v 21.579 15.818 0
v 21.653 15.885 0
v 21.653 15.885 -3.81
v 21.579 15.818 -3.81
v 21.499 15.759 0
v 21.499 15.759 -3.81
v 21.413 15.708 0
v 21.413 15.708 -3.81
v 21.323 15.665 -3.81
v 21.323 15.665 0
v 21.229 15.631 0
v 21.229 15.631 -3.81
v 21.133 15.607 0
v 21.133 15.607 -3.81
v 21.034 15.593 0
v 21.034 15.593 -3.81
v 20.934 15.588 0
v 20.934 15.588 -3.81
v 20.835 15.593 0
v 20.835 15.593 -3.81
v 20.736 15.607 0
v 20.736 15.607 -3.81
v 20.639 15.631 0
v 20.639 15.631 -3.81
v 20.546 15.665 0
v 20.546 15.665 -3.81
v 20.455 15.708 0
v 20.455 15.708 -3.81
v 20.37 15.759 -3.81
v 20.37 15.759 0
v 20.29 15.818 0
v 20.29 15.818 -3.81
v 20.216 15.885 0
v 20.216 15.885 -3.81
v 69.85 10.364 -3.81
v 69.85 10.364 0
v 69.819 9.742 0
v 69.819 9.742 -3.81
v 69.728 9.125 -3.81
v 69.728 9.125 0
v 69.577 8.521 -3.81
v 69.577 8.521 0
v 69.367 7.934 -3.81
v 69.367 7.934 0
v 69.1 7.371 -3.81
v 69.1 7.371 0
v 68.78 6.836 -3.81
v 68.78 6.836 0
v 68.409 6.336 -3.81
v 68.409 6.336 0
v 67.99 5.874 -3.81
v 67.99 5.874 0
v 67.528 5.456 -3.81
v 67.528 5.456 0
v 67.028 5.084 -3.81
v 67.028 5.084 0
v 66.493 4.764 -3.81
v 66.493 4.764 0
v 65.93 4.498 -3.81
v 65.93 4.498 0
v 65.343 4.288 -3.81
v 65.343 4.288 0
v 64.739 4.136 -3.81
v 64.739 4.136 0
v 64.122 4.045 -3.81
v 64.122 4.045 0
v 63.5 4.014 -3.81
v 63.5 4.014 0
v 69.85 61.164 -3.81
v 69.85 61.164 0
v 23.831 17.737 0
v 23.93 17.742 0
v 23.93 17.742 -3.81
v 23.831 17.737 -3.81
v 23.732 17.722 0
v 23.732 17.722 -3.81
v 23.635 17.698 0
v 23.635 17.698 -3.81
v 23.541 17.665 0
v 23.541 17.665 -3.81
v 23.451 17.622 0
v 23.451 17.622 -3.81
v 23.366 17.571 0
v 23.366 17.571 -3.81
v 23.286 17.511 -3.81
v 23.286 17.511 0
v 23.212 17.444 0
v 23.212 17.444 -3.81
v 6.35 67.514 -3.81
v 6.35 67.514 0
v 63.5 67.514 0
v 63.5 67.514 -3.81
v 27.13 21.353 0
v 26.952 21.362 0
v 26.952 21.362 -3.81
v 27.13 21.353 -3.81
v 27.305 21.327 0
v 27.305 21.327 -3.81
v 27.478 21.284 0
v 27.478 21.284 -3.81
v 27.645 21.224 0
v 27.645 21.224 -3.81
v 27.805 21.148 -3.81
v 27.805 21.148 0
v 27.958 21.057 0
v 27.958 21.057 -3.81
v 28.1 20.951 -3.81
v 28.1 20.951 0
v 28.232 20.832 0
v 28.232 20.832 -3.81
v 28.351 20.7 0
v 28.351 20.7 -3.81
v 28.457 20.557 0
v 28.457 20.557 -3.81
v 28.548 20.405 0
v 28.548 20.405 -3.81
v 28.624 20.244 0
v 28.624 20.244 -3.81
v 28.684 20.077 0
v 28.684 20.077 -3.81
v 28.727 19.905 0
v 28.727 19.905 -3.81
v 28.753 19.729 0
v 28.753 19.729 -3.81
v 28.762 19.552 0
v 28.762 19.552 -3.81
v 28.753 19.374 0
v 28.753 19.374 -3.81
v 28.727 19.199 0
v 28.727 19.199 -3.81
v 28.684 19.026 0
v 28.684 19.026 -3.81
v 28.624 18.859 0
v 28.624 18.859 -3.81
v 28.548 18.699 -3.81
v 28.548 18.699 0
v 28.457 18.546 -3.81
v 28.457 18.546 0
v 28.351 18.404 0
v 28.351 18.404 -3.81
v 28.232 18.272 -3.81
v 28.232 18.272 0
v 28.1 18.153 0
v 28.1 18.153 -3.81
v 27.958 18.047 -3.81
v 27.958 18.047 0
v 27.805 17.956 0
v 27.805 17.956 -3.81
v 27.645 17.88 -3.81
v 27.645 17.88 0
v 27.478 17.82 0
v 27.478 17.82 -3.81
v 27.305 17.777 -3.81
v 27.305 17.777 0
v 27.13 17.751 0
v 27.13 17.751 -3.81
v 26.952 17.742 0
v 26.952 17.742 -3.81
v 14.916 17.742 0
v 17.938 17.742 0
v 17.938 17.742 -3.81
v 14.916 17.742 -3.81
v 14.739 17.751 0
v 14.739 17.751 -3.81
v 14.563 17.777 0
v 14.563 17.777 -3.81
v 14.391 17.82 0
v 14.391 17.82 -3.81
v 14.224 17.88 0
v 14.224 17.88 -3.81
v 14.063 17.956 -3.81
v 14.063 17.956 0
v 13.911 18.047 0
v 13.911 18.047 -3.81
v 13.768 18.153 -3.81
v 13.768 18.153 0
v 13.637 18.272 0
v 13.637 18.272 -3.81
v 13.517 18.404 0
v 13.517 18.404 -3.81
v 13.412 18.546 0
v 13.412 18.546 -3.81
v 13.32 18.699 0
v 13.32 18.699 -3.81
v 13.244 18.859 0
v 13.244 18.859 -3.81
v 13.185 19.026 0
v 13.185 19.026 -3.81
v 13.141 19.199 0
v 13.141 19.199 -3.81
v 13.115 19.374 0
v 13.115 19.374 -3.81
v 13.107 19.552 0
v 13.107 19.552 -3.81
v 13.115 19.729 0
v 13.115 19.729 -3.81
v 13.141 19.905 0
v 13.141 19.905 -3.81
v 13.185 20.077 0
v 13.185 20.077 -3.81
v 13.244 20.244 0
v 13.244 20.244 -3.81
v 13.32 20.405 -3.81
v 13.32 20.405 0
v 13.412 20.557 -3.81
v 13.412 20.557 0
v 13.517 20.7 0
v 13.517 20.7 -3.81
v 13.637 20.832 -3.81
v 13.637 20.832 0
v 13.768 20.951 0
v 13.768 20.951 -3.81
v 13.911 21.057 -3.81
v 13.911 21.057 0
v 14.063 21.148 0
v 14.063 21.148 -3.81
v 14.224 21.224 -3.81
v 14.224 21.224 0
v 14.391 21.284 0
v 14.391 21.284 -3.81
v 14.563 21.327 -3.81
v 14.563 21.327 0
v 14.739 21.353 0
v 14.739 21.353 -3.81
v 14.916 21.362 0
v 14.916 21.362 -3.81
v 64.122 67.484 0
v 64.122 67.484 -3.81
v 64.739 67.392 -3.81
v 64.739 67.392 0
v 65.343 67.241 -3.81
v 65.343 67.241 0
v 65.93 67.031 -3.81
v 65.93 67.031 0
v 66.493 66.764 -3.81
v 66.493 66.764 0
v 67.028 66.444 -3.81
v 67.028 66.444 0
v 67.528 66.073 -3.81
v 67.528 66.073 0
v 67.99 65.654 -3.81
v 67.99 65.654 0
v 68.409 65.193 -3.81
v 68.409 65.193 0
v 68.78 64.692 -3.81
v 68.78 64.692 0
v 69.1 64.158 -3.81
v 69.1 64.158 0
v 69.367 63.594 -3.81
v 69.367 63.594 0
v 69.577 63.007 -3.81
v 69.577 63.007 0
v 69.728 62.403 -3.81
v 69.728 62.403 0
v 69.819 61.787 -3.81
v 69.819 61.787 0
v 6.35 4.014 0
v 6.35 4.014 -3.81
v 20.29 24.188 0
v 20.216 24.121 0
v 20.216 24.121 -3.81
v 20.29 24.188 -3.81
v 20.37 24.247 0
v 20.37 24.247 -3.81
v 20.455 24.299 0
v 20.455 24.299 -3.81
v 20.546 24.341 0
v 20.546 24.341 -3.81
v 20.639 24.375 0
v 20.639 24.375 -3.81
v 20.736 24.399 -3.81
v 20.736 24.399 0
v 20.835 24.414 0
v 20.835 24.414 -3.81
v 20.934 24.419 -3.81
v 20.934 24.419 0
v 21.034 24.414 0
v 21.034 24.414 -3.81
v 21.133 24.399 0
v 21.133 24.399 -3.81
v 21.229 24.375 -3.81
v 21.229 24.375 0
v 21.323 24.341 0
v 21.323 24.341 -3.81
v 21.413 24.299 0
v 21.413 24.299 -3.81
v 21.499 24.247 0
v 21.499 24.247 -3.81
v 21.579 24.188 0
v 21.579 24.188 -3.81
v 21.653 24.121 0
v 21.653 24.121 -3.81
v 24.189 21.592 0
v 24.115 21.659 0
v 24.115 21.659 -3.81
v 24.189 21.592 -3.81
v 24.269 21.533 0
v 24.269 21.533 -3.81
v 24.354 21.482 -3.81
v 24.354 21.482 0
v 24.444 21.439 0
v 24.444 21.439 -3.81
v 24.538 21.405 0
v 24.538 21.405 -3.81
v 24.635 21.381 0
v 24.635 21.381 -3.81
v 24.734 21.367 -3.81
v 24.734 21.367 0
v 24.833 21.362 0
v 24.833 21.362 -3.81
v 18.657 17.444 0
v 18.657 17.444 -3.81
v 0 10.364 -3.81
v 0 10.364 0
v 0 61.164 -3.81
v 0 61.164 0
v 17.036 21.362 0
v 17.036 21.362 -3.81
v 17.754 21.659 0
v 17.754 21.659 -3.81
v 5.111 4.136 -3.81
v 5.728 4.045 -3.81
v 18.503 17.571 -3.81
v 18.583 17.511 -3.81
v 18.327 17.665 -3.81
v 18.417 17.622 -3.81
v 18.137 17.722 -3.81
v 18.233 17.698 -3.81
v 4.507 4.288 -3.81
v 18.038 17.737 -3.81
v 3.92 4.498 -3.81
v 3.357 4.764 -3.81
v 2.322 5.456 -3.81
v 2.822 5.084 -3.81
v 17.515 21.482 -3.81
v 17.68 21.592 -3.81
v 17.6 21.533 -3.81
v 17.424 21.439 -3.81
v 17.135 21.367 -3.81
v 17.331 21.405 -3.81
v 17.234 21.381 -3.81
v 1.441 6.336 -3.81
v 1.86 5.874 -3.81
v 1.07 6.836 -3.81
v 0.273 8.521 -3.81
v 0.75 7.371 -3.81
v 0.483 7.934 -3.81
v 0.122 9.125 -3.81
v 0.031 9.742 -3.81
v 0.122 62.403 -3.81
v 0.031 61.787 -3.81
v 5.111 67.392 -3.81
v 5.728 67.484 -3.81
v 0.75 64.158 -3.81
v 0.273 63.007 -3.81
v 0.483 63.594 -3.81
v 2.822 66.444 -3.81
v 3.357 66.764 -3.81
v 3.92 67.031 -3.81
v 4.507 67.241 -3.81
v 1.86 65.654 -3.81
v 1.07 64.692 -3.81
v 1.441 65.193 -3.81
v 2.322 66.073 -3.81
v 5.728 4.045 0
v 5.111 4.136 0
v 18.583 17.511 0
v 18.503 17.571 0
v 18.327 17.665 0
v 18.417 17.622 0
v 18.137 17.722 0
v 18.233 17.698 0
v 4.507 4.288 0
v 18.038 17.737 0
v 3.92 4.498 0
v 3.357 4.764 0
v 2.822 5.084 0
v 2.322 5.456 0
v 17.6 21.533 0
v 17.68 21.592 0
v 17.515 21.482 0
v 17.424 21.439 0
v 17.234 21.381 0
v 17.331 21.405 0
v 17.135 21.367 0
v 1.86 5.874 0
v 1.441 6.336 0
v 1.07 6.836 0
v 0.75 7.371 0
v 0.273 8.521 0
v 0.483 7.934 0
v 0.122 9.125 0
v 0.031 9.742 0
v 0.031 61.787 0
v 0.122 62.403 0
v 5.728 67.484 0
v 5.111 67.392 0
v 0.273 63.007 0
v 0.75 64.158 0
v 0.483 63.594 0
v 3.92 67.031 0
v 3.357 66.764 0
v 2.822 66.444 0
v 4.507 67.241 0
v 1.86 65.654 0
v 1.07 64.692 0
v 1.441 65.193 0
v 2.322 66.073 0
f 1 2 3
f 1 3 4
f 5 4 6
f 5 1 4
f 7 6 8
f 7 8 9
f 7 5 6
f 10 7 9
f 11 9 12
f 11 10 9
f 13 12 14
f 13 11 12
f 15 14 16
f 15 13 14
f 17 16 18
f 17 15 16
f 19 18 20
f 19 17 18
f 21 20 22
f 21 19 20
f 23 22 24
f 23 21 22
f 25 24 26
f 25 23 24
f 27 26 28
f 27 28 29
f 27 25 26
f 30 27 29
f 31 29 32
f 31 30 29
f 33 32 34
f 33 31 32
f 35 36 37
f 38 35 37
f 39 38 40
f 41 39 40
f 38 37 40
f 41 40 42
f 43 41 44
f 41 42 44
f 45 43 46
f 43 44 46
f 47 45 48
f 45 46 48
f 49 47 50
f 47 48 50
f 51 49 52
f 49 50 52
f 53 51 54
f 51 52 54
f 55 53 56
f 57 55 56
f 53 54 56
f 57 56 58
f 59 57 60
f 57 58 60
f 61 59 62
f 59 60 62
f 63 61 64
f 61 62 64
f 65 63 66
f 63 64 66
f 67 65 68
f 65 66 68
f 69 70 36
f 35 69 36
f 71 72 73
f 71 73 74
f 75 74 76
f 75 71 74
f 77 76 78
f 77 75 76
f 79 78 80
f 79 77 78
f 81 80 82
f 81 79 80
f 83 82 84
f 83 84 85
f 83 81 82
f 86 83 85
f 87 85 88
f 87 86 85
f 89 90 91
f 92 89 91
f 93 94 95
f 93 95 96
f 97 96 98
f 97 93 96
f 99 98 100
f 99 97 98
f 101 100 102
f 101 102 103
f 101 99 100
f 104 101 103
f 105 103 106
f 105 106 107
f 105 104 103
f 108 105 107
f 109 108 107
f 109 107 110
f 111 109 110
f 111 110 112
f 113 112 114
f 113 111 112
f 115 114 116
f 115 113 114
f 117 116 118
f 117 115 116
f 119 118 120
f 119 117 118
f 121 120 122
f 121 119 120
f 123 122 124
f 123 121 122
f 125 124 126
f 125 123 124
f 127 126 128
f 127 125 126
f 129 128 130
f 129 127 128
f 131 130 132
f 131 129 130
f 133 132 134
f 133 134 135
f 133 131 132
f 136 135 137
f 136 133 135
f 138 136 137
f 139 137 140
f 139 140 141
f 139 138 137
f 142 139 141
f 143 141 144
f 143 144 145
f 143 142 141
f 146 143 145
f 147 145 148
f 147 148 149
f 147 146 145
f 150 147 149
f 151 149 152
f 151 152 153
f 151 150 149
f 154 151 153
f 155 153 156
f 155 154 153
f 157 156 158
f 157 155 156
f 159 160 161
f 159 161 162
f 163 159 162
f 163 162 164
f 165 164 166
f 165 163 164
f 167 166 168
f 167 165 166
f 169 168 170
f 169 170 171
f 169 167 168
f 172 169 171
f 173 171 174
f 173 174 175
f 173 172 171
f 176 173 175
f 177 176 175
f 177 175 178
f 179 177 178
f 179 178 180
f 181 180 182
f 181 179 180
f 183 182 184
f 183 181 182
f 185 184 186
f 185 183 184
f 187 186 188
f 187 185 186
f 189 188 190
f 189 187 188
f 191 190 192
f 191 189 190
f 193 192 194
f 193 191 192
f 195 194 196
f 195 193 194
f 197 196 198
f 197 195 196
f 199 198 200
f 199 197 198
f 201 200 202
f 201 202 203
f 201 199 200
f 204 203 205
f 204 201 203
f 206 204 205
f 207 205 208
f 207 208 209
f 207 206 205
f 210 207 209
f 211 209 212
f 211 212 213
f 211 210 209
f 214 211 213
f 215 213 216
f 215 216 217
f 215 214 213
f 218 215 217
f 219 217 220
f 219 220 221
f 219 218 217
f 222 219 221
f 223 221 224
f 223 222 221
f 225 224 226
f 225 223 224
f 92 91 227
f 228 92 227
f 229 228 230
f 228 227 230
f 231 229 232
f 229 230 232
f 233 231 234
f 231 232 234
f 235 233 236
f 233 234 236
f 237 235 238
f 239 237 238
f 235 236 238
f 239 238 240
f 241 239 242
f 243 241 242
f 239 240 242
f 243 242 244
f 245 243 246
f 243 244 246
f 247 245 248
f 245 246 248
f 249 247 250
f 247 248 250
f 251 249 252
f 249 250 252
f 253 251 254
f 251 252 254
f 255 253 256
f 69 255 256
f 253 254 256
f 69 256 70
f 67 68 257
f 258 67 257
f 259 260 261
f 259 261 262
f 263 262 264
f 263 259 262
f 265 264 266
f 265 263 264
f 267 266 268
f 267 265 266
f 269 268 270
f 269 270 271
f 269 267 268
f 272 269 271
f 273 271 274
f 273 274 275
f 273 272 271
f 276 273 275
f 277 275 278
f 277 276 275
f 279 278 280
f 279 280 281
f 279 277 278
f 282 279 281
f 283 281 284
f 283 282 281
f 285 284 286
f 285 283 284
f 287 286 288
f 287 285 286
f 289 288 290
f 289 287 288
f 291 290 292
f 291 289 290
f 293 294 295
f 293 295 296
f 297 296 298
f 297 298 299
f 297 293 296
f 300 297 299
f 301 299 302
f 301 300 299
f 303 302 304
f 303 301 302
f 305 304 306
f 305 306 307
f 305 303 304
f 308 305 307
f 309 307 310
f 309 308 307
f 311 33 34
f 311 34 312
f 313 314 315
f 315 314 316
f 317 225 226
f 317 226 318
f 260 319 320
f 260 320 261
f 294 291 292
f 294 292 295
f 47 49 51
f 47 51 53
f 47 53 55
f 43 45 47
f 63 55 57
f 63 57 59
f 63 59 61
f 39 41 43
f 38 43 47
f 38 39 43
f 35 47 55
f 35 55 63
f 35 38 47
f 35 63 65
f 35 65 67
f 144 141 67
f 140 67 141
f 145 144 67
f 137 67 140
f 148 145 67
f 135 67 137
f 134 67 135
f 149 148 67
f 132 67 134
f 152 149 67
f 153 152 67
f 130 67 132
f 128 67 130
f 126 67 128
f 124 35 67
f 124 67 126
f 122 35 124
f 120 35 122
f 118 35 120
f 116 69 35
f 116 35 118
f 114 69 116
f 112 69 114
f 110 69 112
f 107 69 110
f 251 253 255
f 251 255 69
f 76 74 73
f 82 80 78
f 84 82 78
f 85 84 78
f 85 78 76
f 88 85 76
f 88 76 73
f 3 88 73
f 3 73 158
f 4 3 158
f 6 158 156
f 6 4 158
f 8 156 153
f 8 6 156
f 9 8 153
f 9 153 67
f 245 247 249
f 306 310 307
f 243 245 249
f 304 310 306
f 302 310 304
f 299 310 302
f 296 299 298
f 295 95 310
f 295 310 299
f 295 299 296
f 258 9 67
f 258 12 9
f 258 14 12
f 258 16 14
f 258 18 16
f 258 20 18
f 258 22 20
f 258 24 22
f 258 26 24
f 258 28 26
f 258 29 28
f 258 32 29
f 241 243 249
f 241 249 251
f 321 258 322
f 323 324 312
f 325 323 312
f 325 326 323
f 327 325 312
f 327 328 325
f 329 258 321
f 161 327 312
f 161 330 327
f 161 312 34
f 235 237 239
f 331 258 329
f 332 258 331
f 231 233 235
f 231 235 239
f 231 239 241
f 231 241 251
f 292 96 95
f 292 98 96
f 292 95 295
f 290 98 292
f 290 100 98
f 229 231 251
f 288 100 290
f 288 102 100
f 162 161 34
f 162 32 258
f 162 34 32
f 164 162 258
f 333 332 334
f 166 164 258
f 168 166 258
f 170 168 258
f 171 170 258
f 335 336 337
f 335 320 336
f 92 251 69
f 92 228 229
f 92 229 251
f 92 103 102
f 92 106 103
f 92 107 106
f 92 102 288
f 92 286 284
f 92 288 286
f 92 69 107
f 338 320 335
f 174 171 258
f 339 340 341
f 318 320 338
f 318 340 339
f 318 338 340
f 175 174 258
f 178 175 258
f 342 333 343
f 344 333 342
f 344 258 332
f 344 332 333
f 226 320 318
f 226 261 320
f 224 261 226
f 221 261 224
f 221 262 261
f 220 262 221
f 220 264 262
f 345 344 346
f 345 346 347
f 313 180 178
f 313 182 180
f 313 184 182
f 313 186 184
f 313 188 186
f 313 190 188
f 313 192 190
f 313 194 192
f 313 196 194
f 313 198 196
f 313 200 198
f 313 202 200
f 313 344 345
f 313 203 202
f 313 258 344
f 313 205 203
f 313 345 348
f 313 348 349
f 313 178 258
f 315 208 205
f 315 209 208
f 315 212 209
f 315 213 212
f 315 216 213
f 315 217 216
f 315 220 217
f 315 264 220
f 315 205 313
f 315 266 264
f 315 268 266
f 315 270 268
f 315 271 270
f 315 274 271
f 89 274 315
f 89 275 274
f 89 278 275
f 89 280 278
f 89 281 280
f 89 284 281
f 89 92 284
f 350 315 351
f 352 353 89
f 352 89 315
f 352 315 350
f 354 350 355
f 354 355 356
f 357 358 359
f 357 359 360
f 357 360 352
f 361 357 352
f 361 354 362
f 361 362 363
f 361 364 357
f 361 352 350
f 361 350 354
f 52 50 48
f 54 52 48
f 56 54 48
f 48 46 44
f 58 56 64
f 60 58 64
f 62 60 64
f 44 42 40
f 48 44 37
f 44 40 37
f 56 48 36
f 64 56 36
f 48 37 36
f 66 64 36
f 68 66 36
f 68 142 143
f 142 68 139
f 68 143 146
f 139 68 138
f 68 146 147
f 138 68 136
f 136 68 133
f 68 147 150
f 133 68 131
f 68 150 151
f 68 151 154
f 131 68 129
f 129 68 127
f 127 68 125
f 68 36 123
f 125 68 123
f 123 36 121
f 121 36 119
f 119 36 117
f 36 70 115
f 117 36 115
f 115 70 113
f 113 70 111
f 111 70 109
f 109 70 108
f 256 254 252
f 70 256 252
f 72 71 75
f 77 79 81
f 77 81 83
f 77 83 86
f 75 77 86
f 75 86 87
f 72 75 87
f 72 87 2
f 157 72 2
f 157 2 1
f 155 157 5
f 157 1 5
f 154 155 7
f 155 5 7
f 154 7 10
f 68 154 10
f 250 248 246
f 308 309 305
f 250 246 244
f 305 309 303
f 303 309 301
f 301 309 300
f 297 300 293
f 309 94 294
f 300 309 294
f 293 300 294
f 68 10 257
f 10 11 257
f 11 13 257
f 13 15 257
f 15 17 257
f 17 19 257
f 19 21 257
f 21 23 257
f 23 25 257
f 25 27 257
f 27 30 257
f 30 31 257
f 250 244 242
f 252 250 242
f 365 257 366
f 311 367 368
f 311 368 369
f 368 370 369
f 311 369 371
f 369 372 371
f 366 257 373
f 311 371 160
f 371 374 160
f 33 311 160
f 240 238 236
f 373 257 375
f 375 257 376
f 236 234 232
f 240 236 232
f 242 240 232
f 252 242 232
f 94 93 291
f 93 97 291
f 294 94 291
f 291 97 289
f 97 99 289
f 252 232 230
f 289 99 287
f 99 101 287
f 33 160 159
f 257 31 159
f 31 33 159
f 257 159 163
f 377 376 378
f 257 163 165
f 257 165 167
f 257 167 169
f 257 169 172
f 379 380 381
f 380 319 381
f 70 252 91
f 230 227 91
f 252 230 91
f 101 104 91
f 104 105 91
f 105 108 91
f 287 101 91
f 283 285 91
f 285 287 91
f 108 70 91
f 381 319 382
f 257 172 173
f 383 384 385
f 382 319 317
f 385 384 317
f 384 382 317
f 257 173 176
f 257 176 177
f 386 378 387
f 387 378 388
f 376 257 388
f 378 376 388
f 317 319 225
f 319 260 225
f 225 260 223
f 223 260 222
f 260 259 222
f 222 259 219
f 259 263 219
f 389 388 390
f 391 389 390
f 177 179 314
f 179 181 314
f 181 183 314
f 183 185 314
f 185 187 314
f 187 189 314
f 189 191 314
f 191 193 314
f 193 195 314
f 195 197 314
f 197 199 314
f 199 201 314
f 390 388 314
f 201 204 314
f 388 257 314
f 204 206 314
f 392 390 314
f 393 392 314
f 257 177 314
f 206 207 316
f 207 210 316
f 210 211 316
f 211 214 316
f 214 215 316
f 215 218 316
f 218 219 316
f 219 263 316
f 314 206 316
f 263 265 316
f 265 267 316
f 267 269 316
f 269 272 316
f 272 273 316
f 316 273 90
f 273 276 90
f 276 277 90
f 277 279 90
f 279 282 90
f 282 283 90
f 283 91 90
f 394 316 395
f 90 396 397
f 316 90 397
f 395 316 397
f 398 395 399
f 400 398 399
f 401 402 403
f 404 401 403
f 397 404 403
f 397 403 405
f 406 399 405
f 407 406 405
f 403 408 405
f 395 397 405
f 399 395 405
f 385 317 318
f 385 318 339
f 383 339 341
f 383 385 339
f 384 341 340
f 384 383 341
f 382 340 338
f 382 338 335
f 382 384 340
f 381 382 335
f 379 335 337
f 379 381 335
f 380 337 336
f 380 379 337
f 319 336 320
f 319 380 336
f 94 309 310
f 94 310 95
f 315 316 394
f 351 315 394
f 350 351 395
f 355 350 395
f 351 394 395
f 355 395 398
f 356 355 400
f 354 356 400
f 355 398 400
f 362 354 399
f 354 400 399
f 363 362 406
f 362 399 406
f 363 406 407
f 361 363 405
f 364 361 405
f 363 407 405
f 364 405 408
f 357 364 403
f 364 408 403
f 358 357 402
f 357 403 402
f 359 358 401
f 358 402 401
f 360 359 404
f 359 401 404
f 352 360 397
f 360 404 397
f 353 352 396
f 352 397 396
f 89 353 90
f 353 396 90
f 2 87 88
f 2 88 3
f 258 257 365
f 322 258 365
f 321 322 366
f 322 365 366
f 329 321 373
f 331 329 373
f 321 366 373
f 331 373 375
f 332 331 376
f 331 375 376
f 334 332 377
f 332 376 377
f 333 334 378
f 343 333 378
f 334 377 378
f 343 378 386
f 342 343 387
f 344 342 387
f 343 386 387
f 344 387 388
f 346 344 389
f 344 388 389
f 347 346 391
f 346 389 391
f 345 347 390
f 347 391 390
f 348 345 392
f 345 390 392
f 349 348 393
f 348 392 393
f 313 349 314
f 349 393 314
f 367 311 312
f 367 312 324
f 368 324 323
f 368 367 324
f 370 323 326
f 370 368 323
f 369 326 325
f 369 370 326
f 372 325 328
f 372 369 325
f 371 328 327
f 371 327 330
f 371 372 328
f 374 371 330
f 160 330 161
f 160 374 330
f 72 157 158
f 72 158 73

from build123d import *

# Parameters (mm, degrees)
EXTRUDE1_DEPTH = 3.81


with BuildPart() as part:
    # Sketch1 → Extrude1 (new body)
    with BuildSketch(Plane.XY):
        with BuildLine():
            Line((0, 10.36418202), (0, 61.16418202))
            ThreePointArc((0, 61.16418202), (1.859871939, 65.65431008), (6.35, 67.51418202))
            Line((6.35, 67.51418202), (63.5, 67.51418202))
            ThreePointArc((63.5, 67.51418202), (67.990128061, 65.65431008), (69.85, 61.16418202))
            Line((69.85, 61.16418202), (69.85, 10.36418202))
            ThreePointArc((69.85, 10.36418202), (67.990128061, 5.874053959), (63.5, 4.01418202))
            Line((63.5, 4.01418202), (6.35, 4.01418202))
            ThreePointArc((6.35, 4.01418202), (1.859871939, 5.874053959), (0, 10.36418202))
        make_face()
        with BuildLine():
            Line((24.833096834, 21.361626027), (26.952255854, 21.361626027))
            ThreePointArc((26.952255854, 21.361626027), (28.762066969, 19.551814912), (26.952255854, 17.742003797))
            Line((26.952255854, 17.742003797), (23.93028833, 17.742003797))
            ThreePointArc((23.93028833, 17.742003797), (23.541481963, 17.664665402), (23.211867841, 17.444424287))
            Line((23.211867841, 17.444424287), (21.65276114, 15.885317586))
            ThreePointArc((21.65276114, 15.885317586), (20.93434065, 15.587738076), (20.215920161, 15.885317586))
            Line((20.215920161, 15.885317586), (18.65681346, 17.444424287))
            ThreePointArc((18.65681346, 17.444424287), (18.327199337, 17.664665402), (17.93839297, 17.742003797))
            Line((17.93839297, 17.742003797), (14.916425446, 17.742003797))
            ThreePointArc((14.916425446, 17.742003797), (13.106614331, 19.551814912), (14.916425446, 21.361626027))
            Line((14.916425446, 21.361626027), (17.035584467, 21.361626027))
            ThreePointArc((17.035584467, 21.361626027), (17.424390834, 21.438964422), (17.754004956, 21.659205538))
            Line((17.754004956, 21.659205538), (20.215920161, 24.121120742))
            ThreePointArc((20.215920161, 24.121120742), (20.93434065, 24.418700252), (21.65276114, 24.121120742))
            Line((21.65276114, 24.121120742), (24.114676344, 21.659205538))
            ThreePointArc((24.114676344, 21.659205538), (24.444290467, 21.438964422), (24.833096834, 21.361626027))
        make_face(mode=Mode.SUBTRACT)
    extrude(amount=-EXTRUDE1_DEPTH)


solid = part.part
